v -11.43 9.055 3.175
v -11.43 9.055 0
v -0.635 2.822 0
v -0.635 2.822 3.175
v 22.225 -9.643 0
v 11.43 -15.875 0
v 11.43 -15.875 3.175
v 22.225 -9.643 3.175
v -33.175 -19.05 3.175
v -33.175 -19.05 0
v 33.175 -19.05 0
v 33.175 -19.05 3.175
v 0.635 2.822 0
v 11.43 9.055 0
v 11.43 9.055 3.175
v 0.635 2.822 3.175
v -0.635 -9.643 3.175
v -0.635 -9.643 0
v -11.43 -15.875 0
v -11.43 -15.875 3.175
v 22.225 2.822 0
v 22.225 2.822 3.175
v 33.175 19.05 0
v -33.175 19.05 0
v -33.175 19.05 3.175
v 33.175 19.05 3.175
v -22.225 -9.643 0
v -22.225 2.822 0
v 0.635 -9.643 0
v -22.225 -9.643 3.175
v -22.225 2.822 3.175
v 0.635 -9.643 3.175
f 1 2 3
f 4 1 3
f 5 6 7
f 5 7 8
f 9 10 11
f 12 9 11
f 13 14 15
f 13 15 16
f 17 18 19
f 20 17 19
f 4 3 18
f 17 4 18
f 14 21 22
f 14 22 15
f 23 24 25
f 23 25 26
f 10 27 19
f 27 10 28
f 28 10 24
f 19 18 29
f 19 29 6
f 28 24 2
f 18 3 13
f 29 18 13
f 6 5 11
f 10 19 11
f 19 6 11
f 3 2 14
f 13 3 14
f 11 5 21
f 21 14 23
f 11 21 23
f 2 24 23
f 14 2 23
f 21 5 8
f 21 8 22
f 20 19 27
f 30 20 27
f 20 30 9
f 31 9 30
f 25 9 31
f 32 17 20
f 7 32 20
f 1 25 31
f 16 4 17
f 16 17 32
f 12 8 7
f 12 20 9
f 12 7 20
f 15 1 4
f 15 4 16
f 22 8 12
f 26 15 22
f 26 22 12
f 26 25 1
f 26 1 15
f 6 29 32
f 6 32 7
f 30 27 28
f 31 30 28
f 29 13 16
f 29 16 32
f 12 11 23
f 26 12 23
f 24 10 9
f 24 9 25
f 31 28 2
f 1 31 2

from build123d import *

# Parameters (mm, degrees)
SKETCH1_W           = 66.34988
SKETCH1_H           = 38.1
BOSS_EXTRUDE1_DEPTH = 3.175


with BuildPart() as part:
    # Sketch1 → Boss-Extrude1 (new body)
    with BuildSketch(Plane.XY):
        Rectangle(SKETCH1_W, SKETCH1_H)
        Polygon((11.43, -15.875), (22.225000466, -9.642503575), (22.225000466, 2.822489275), (11.43, 9.0549857), (0.634999534, 2.822489275), (0.634999534, -9.642503575), align=None, mode=Mode.SUBTRACT)
        Polygon((-0.634999534, -9.642503575), (-11.43, -15.875), (-22.225000466, -9.642503575), (-22.225000466, 2.822489275), (-11.43, 9.0549857), (-0.634999534, 2.822489275), align=None, mode=Mode.SUBTRACT)
    extrude(amount=BOSS_EXTRUDE1_DEPTH)


solid = part.part
